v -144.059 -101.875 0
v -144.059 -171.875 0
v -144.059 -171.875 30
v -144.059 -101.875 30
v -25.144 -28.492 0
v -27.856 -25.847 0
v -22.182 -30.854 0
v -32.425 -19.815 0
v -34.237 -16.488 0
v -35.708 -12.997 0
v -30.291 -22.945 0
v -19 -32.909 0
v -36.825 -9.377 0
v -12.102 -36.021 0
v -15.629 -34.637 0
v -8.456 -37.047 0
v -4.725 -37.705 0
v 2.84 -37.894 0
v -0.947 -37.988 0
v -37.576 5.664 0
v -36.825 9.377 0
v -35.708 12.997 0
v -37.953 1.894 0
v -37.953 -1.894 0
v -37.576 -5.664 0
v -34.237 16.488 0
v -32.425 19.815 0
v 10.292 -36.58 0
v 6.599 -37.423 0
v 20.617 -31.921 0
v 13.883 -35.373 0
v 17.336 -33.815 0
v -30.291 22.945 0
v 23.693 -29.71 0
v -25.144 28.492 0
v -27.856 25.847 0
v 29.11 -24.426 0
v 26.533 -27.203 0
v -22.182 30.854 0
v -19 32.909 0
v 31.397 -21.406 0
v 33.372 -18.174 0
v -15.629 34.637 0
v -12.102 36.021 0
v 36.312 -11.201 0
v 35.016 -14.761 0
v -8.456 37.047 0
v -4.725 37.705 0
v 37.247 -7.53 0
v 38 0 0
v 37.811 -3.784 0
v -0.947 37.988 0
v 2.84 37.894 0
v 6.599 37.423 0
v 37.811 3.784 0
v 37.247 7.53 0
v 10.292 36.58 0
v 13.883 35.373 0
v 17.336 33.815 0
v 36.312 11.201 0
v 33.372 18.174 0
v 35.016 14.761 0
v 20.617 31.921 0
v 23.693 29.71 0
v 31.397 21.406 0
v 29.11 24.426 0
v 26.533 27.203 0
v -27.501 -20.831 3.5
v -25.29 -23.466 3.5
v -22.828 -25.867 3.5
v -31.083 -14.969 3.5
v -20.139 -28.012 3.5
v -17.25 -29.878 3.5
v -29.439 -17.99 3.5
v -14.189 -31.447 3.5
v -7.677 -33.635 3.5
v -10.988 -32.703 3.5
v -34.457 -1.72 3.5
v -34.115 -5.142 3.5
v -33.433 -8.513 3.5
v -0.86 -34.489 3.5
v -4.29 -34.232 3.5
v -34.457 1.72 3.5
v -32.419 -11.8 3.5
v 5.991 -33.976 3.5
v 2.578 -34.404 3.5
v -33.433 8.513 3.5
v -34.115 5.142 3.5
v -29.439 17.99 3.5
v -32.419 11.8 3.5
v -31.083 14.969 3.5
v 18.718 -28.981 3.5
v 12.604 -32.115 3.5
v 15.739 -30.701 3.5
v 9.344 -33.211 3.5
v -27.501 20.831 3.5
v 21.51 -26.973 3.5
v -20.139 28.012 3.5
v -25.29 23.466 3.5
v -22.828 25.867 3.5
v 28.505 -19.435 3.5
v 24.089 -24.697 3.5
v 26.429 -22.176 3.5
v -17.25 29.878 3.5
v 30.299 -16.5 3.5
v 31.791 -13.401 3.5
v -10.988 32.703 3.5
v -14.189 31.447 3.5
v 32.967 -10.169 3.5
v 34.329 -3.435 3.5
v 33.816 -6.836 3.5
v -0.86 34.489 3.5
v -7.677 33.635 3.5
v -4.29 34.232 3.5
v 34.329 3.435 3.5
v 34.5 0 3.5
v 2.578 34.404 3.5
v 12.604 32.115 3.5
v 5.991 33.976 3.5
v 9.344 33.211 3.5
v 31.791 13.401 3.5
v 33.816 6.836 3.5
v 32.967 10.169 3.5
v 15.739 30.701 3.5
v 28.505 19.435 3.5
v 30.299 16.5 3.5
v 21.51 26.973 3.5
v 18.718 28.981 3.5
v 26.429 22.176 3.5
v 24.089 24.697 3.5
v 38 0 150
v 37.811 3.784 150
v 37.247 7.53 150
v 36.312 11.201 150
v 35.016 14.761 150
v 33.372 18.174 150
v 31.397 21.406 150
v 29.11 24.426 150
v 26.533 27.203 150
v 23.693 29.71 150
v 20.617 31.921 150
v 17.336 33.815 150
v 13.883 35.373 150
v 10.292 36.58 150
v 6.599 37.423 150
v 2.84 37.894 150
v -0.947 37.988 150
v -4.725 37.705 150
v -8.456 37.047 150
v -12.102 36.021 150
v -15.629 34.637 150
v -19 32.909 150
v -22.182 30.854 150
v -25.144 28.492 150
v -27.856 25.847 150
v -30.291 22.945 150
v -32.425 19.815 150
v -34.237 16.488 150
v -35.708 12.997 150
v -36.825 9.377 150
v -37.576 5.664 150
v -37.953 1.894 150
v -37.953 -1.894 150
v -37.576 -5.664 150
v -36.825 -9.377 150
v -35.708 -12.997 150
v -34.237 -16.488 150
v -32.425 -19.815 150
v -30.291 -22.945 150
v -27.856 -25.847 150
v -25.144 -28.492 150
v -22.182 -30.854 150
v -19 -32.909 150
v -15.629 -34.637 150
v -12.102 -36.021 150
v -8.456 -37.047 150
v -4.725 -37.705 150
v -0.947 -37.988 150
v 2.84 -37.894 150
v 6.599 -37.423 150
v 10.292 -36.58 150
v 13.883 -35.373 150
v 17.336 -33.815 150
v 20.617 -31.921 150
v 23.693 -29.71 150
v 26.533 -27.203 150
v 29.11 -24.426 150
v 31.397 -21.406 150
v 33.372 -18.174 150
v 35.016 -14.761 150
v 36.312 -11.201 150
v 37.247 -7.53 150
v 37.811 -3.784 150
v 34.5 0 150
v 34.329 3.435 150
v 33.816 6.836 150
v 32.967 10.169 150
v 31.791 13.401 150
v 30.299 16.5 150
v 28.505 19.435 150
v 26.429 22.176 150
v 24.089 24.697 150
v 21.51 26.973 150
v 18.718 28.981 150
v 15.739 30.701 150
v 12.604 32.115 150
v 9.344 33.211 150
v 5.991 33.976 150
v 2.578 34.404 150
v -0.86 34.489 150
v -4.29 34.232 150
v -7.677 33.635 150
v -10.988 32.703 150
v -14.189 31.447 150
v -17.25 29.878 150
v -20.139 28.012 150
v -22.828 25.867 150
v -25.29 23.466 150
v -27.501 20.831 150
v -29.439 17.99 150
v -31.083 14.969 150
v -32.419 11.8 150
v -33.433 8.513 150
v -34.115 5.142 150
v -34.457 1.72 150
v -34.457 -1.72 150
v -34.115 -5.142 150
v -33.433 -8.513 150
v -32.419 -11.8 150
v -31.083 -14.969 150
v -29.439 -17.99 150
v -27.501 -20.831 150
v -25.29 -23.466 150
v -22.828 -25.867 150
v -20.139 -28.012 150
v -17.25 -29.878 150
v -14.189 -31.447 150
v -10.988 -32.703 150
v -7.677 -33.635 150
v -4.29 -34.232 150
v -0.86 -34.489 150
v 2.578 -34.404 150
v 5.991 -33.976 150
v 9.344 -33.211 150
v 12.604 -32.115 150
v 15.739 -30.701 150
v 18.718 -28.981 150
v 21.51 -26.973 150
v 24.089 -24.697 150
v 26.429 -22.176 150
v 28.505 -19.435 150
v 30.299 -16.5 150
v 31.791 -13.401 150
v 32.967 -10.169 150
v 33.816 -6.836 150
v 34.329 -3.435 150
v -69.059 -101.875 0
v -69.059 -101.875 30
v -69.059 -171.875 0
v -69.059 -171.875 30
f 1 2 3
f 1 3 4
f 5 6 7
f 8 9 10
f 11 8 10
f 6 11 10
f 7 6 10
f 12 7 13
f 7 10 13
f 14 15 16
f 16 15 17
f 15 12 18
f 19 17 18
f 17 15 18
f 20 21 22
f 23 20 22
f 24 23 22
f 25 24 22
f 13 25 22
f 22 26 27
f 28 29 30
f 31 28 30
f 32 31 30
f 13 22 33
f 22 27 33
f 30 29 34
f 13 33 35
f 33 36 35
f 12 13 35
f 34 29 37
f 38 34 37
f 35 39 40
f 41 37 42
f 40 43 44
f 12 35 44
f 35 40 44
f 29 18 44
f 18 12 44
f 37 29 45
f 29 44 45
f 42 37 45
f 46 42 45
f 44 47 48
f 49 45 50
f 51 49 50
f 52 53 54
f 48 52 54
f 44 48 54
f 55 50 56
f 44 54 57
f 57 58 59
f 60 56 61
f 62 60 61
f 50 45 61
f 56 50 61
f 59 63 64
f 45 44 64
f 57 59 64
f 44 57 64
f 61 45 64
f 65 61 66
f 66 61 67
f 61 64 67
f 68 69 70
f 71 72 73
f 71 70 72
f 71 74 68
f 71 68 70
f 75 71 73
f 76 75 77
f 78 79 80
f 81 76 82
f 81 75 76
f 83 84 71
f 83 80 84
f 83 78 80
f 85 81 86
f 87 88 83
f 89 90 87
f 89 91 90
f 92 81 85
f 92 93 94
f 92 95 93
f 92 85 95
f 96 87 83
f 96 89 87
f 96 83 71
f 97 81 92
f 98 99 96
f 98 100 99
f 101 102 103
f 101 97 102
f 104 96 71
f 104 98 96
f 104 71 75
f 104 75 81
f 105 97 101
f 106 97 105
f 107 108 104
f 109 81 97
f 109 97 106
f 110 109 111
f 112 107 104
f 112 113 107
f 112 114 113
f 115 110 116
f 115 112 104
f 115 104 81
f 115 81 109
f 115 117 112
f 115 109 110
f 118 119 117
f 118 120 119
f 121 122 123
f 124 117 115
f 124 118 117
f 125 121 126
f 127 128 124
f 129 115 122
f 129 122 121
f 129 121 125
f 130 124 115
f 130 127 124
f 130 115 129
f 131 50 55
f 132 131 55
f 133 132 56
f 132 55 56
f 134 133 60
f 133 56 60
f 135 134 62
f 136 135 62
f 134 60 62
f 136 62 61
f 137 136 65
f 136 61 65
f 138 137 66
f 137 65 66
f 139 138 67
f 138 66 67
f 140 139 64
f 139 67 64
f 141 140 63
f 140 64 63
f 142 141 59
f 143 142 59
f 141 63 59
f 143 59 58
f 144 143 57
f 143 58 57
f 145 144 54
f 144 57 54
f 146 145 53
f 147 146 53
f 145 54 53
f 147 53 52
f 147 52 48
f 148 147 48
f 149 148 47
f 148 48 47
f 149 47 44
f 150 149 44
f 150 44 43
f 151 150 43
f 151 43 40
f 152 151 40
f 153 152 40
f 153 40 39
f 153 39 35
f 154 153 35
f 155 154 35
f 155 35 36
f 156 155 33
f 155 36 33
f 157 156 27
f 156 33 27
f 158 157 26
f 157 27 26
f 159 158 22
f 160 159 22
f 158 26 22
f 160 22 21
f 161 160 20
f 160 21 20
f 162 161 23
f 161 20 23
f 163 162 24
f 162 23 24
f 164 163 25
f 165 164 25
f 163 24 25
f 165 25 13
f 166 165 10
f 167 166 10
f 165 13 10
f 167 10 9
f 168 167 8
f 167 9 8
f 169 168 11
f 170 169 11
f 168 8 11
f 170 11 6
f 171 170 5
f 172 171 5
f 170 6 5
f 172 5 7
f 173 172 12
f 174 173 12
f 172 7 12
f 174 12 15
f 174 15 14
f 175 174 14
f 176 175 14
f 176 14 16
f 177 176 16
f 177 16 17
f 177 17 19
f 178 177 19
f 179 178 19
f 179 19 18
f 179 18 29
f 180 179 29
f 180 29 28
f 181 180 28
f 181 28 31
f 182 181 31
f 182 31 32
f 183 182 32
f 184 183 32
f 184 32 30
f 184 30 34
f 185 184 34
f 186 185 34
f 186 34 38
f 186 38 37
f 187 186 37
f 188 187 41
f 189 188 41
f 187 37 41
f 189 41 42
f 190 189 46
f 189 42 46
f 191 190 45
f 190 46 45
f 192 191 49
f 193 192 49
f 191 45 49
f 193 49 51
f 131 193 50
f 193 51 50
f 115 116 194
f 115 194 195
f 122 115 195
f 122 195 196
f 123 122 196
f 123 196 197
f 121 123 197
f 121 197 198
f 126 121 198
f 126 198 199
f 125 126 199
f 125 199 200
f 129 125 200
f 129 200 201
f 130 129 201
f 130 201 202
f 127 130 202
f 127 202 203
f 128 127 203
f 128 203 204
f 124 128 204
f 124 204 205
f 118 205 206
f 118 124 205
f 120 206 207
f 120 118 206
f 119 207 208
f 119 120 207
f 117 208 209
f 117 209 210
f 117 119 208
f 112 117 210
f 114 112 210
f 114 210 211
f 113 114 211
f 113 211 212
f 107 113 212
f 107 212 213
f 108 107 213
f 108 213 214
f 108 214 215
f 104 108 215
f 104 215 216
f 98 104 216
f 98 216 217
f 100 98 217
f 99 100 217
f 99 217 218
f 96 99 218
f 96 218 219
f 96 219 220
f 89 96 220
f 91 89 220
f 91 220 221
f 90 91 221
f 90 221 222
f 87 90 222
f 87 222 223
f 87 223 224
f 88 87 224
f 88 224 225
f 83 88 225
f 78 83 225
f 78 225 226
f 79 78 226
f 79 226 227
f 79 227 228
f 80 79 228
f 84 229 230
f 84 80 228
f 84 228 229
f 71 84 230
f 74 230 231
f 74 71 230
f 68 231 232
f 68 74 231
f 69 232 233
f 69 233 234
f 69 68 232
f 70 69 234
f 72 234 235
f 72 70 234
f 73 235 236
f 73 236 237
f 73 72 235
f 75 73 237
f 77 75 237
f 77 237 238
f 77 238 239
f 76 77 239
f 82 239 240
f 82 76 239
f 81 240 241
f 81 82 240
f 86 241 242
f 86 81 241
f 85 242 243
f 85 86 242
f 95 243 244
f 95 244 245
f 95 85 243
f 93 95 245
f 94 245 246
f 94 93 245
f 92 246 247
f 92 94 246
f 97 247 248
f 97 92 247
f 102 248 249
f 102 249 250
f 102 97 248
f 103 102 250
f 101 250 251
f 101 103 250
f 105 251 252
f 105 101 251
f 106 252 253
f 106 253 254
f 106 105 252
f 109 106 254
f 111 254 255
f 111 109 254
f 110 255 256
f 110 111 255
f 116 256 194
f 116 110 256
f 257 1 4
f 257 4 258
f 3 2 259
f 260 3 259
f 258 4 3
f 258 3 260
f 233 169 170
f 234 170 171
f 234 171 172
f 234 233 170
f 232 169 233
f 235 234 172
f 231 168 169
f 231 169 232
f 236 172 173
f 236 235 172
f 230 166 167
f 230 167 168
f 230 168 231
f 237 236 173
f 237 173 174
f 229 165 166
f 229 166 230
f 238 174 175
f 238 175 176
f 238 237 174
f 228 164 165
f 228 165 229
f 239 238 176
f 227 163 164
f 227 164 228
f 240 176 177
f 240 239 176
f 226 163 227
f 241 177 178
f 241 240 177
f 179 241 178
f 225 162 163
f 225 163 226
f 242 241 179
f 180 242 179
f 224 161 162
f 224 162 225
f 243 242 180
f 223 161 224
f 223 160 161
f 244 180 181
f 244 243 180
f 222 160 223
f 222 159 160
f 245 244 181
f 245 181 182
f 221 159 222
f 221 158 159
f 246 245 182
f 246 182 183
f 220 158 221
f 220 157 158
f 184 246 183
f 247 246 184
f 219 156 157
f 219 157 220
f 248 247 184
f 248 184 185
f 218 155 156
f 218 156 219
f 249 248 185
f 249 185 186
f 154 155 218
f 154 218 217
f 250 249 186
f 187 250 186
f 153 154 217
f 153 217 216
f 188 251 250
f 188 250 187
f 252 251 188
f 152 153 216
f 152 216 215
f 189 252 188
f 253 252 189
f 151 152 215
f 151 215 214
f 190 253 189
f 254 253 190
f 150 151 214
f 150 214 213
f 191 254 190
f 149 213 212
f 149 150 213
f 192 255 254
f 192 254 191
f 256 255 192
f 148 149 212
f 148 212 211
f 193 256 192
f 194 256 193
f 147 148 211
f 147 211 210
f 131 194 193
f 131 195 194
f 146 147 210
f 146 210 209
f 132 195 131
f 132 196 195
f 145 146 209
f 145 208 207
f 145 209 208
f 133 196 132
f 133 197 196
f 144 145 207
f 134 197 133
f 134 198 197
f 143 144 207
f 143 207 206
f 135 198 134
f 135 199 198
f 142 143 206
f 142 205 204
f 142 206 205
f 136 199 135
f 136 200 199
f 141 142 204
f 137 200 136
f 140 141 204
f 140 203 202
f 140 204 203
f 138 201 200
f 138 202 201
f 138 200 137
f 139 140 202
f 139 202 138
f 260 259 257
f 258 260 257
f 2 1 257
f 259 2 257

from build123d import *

# Parameters (mm, degrees)
F0_R     = 38
F1_DEPTH = 150
F2_T     = -3.5
F3_W     = 75
F3_H     = 70
F4_DEPTH = 30


with BuildPart() as f1:
    # F0 (on Top) → F1 (new body)
    with BuildSketch(Plane.XY):
        Circle(F0_R)
    extrude(amount=F1_DEPTH)

    # F2
    f2_openings = [f1.faces().sort_by_distance(p)[0] for p in [
        (0, 0, 150),
    ]]
    offset(amount=F2_T, openings=f2_openings)


with BuildPart() as f4:
    # F3 (on Top) → F4 (new body)
    with BuildSketch(Plane.XY):
        with Locations((-106.558636, -136.874975)):
            Rectangle(F3_W, F3_H)
    extrude(amount=F4_DEPTH)


solid = Compound([f1.part, f4.part])
